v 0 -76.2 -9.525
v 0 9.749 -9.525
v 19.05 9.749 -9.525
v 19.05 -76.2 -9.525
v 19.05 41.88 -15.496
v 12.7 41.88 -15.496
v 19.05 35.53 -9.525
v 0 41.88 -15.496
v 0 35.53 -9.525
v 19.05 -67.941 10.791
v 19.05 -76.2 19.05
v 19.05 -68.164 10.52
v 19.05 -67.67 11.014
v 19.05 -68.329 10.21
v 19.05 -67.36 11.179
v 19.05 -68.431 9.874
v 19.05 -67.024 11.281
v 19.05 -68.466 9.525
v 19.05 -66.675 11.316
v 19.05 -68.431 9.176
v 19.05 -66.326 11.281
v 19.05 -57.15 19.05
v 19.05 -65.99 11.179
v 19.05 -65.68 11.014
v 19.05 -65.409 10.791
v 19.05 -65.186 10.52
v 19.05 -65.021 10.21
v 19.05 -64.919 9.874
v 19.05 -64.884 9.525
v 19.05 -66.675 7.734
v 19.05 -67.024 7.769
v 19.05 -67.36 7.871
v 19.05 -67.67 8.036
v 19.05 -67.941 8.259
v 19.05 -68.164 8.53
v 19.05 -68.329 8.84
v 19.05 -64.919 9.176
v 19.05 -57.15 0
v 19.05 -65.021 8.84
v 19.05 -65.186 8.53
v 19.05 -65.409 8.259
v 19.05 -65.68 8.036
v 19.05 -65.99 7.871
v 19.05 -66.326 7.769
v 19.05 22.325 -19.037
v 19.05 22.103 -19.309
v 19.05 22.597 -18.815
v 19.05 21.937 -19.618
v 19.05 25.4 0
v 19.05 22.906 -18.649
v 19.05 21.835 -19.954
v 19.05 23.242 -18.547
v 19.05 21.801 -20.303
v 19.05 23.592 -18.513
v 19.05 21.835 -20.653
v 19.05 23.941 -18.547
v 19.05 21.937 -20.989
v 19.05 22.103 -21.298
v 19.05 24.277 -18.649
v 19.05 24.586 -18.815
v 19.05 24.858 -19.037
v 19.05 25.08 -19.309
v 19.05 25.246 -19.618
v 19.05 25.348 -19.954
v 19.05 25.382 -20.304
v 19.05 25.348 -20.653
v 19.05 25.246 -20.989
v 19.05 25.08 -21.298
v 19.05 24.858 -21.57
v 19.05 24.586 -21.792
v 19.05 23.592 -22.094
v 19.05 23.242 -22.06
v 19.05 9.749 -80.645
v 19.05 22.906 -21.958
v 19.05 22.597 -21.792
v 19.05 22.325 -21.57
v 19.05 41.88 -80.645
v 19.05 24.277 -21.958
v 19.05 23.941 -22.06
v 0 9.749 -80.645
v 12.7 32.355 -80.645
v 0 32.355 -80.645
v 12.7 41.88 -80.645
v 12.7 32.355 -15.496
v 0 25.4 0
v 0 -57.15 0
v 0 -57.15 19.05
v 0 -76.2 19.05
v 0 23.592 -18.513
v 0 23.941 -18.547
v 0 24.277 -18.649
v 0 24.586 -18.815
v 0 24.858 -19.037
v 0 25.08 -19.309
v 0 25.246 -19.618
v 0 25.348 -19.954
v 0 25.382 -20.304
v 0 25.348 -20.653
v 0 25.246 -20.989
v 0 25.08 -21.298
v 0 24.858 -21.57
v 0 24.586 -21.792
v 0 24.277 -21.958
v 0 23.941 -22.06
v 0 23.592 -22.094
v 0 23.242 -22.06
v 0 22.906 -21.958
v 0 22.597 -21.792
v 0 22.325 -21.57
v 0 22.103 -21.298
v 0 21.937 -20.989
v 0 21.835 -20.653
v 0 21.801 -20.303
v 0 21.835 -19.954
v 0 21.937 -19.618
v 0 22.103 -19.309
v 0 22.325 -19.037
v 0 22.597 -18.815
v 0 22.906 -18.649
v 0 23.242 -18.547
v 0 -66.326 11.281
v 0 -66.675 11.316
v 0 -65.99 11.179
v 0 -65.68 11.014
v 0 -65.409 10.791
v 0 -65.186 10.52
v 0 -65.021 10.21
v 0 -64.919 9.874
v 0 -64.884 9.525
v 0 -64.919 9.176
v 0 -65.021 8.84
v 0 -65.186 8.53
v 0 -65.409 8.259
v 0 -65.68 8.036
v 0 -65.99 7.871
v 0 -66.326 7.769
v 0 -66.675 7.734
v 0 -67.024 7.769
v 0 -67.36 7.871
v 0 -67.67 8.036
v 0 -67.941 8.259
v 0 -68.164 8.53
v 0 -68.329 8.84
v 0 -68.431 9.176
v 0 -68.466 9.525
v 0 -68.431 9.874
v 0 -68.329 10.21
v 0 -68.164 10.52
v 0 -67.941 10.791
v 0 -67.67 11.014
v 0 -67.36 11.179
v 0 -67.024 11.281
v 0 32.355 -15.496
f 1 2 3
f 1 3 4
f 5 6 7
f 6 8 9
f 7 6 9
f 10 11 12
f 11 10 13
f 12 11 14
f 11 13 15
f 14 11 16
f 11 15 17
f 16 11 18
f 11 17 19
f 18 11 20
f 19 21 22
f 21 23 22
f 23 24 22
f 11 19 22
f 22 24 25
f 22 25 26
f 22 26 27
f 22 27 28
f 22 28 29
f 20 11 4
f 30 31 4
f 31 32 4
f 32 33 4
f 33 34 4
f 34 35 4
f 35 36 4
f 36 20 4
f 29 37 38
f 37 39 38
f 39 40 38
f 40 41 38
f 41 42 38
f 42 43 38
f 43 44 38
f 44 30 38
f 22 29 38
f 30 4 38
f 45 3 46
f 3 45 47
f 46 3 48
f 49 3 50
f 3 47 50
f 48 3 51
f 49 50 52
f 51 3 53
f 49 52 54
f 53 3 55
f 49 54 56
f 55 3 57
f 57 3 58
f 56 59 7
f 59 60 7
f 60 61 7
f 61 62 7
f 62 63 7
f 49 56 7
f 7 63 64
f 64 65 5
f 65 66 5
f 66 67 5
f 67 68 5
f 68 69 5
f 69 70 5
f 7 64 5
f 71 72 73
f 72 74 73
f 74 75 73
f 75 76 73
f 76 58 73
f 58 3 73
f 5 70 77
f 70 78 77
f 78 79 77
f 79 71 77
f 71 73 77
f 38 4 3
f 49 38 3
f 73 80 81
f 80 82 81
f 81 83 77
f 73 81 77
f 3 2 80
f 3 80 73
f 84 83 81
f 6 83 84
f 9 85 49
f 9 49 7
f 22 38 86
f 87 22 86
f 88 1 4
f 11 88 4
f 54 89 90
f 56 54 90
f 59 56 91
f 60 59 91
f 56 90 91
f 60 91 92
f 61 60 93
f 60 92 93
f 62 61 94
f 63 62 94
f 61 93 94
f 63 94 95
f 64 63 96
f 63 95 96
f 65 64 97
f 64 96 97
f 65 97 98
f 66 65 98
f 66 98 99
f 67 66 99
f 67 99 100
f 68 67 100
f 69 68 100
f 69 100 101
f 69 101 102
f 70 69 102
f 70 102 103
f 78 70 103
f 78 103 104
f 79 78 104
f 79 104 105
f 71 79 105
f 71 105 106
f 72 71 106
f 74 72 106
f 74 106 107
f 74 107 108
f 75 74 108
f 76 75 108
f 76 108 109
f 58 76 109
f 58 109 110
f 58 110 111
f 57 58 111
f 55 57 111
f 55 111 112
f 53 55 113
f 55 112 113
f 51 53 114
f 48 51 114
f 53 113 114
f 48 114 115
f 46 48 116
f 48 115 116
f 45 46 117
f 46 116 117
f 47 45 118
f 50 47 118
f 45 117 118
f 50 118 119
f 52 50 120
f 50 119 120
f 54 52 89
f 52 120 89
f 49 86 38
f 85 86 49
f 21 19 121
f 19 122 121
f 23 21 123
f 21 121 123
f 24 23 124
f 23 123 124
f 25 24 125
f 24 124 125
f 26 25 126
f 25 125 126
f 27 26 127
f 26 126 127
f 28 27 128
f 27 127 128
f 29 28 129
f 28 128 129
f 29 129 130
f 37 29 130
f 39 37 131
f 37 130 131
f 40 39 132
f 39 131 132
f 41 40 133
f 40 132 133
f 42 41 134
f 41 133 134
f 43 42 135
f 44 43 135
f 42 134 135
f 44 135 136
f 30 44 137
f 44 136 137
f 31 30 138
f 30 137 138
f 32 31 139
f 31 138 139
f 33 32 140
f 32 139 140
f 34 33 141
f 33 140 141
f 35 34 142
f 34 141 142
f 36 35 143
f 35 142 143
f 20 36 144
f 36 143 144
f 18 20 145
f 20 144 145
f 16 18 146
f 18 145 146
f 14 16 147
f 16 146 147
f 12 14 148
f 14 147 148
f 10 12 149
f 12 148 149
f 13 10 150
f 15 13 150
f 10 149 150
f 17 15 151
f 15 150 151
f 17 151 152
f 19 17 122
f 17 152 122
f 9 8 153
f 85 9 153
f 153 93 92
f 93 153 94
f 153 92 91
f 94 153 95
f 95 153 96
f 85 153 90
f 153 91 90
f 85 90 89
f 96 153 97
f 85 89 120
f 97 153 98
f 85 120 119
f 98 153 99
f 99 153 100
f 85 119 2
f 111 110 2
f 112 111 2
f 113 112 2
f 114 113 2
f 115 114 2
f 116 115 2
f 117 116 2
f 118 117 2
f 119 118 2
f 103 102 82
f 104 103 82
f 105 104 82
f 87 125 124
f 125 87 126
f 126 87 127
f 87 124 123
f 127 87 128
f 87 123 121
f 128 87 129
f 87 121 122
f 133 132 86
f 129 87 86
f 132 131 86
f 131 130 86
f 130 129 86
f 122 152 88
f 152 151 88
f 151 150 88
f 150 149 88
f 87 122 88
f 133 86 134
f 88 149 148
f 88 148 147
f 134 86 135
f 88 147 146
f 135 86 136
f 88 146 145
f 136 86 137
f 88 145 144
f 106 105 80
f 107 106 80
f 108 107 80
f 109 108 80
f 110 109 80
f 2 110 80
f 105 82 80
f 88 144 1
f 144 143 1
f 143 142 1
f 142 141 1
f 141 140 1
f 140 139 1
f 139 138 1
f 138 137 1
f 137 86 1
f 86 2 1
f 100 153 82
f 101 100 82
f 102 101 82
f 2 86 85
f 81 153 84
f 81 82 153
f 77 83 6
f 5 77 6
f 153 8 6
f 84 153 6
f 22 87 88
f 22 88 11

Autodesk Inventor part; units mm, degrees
ref_plane "YZ Plane" through (0, 0, 0) normal (1, 0, 0) x (0, 1, 0)
ref_plane "XZ Plane" through (0, 0, 0) normal (0, 1, 0) x (-1, 0, 0)
ref_plane "XY Plane" through (0, 0, 0) normal (0, 0, 1) x (1, 0, 0)
sketch "Sketch1" plane through (0, 0, 0) normal (1, 0, 0) x (0, 1, 0)
  line L0 (0, 0) -> (25.4, 0)
  line L1 (25.4, 0) -> (25.4, -9.525)
  line L2 (25.4, -9.525) -> (0, -9.525)
  line L3 (0, -9.525) -> (0, 0)
  line L4 (25.4, -9.525) -> (35.5298, -9.525)
  line L5 (35.5298, -9.525) -> (35.5298, -29.845)
  line L6 (25.4, -9.525) -> (25.4, -24.4288)
  line L7 (25.4, -24.4288) -> (25.4, -29.845)
  line L8 (35.5298, -29.845) -> (26.0048, -29.845)
  line L9 (26.0048, -29.845) -> (26.0048, -80.645)
  line L10 (26.0048, -80.645) -> (35.5298, -80.645)
  line L11 (35.5298, -80.645) -> (35.5298, -29.845)
  line L12 (35.5298, -80.645) -> (41.8798, -80.645)
  line L13 (41.8798, -80.645) -> (41.8798, -15.4958)
  line L14 (41.8798, -15.4958) -> (35.5298, -15.4958)
  line L15 (35.5298, -15.4958) -> (35.5298, -80.645)
  line L16 (25.4, 0) -> (35.5298, -9.525)
  line L17 (41.8798, -15.4958) -> (35.5298, -9.525)
  line L18 (26.0048, -29.845) -> (25.4, -29.845)
  line L19 (0, 0) -> (-76.2, 0)
  line L20 (-76.2, 0) -> (-76.2, -9.525)
  line L21 (-76.2, -9.525) -> (0, -9.525)
  line L22 (0, -9.525) -> (0, 0)
  dimension "d0" = 25.4
  dimension "d1" = 9.525
  dimension "d3" = 20.32
  dimension "d11" = 50.8
  dimension "d12" = 6.35
  dimension "d13" = 76.2
  dimension "d14" = 9.525
extrude "Extrusion1" add sketch "Sketch1" along normal blind 19.05
sketch "Sketch4" plane through (0, 26.0048, -80.645) normal (0, -1, 0) x (1, 0, 0)
  line L0 (0, 0) -> (0, 65.1492) projected
  line L1 (19.05, 71.12) -> (19.05, 50.8) projected
  line L2 (0, 0) -> (19.05, 0)
  line L3 (19.05, 0) -> (19.05, 71.12)
  line L4 (19.05, 71.12) -> (0, 71.12)
  line L5 (0, 71.12) -> (0, 0)
  point P0 (0, 80.645)
  point P1 (0, 65.1492)
extrude "Extrusion3" add sketch "Sketch4" along normal blind 16.256
sketch "Sketch5" plane through (0, 41.8798, -15.4958) normal (0, 1, 0) x (1, 0, 0)
  line L0 (0, 65.1492) -> (19.05, 65.1492) projected
  line L1 (0, 0) -> (19.05, 0) projected
  line L2 (0, 65.1492) -> (12.7, 65.1492)
  line L3 (12.7, 65.1492) -> (12.7, 0)
  line L4 (12.7, 0) -> (0, 0)
  line L5 (0, 0) -> (0, 65.1492)
  point P0 (0, -15.4958)
  dimension "d17" = 12.7
extrude "Extrusion4" cut sketch "Sketch5" against normal blind 9.525
sketch "Sketch6" plane through (0, 0, 0) normal (-1, 0, 0) x (0, 0, 1)
  circle A0 centre (-20.3035, 23.5915) radius 1.7907
  point P0 (0, 0)
  dimension "d20" = 3.5814
extrude "Extrusion5" cut sketch "Sketch6" against normal blind 92.075
sketch "Sketch7" plane through (0, -76.2, 0) normal (0, 0, 1) x (1, 0, 0)
  line L0 (0, 0) -> (19.05, 0) projected
  line L1 (0, 0) -> (19.05, 0)
  line L2 (19.05, 0) -> (19.05, 19.05)
  line L3 (19.05, 19.05) -> (0, 19.05)
  line L4 (0, 19.05) -> (0, 0)
  point P0 (0, 76.2)
  dimension "d23" = 19.05
  dimension "d24" = 19.05
extrude "Extrusion6" add sketch "Sketch7" along normal blind 19.05
sketch "Sketch8" plane through (0, 0, 0) normal (-1, 0, 0) x (0, 0, 1)
  line L0 (-9.525, -76.2) -> (19.05, -76.2) projected
  line L1 (0, -57.15) -> (19.05, -76.2)
  line L2 (19.05, -76.2) -> (19.05, -57.15)
  line L3 (19.05, -57.15) -> (0, -76.2)
  circle A0 centre (9.525, -66.675) radius 1.7907
  point P0 (0, 0)
  dimension "d27" = 3.5814
extrude "Extrusion7" cut sketch "Sketch8" against normal blind 31.75 contours A0 L1 L3 | L3 L1 A0 | L1 L3 A0 | L1 A0 L3
properties part number "GripperServoAtt"
